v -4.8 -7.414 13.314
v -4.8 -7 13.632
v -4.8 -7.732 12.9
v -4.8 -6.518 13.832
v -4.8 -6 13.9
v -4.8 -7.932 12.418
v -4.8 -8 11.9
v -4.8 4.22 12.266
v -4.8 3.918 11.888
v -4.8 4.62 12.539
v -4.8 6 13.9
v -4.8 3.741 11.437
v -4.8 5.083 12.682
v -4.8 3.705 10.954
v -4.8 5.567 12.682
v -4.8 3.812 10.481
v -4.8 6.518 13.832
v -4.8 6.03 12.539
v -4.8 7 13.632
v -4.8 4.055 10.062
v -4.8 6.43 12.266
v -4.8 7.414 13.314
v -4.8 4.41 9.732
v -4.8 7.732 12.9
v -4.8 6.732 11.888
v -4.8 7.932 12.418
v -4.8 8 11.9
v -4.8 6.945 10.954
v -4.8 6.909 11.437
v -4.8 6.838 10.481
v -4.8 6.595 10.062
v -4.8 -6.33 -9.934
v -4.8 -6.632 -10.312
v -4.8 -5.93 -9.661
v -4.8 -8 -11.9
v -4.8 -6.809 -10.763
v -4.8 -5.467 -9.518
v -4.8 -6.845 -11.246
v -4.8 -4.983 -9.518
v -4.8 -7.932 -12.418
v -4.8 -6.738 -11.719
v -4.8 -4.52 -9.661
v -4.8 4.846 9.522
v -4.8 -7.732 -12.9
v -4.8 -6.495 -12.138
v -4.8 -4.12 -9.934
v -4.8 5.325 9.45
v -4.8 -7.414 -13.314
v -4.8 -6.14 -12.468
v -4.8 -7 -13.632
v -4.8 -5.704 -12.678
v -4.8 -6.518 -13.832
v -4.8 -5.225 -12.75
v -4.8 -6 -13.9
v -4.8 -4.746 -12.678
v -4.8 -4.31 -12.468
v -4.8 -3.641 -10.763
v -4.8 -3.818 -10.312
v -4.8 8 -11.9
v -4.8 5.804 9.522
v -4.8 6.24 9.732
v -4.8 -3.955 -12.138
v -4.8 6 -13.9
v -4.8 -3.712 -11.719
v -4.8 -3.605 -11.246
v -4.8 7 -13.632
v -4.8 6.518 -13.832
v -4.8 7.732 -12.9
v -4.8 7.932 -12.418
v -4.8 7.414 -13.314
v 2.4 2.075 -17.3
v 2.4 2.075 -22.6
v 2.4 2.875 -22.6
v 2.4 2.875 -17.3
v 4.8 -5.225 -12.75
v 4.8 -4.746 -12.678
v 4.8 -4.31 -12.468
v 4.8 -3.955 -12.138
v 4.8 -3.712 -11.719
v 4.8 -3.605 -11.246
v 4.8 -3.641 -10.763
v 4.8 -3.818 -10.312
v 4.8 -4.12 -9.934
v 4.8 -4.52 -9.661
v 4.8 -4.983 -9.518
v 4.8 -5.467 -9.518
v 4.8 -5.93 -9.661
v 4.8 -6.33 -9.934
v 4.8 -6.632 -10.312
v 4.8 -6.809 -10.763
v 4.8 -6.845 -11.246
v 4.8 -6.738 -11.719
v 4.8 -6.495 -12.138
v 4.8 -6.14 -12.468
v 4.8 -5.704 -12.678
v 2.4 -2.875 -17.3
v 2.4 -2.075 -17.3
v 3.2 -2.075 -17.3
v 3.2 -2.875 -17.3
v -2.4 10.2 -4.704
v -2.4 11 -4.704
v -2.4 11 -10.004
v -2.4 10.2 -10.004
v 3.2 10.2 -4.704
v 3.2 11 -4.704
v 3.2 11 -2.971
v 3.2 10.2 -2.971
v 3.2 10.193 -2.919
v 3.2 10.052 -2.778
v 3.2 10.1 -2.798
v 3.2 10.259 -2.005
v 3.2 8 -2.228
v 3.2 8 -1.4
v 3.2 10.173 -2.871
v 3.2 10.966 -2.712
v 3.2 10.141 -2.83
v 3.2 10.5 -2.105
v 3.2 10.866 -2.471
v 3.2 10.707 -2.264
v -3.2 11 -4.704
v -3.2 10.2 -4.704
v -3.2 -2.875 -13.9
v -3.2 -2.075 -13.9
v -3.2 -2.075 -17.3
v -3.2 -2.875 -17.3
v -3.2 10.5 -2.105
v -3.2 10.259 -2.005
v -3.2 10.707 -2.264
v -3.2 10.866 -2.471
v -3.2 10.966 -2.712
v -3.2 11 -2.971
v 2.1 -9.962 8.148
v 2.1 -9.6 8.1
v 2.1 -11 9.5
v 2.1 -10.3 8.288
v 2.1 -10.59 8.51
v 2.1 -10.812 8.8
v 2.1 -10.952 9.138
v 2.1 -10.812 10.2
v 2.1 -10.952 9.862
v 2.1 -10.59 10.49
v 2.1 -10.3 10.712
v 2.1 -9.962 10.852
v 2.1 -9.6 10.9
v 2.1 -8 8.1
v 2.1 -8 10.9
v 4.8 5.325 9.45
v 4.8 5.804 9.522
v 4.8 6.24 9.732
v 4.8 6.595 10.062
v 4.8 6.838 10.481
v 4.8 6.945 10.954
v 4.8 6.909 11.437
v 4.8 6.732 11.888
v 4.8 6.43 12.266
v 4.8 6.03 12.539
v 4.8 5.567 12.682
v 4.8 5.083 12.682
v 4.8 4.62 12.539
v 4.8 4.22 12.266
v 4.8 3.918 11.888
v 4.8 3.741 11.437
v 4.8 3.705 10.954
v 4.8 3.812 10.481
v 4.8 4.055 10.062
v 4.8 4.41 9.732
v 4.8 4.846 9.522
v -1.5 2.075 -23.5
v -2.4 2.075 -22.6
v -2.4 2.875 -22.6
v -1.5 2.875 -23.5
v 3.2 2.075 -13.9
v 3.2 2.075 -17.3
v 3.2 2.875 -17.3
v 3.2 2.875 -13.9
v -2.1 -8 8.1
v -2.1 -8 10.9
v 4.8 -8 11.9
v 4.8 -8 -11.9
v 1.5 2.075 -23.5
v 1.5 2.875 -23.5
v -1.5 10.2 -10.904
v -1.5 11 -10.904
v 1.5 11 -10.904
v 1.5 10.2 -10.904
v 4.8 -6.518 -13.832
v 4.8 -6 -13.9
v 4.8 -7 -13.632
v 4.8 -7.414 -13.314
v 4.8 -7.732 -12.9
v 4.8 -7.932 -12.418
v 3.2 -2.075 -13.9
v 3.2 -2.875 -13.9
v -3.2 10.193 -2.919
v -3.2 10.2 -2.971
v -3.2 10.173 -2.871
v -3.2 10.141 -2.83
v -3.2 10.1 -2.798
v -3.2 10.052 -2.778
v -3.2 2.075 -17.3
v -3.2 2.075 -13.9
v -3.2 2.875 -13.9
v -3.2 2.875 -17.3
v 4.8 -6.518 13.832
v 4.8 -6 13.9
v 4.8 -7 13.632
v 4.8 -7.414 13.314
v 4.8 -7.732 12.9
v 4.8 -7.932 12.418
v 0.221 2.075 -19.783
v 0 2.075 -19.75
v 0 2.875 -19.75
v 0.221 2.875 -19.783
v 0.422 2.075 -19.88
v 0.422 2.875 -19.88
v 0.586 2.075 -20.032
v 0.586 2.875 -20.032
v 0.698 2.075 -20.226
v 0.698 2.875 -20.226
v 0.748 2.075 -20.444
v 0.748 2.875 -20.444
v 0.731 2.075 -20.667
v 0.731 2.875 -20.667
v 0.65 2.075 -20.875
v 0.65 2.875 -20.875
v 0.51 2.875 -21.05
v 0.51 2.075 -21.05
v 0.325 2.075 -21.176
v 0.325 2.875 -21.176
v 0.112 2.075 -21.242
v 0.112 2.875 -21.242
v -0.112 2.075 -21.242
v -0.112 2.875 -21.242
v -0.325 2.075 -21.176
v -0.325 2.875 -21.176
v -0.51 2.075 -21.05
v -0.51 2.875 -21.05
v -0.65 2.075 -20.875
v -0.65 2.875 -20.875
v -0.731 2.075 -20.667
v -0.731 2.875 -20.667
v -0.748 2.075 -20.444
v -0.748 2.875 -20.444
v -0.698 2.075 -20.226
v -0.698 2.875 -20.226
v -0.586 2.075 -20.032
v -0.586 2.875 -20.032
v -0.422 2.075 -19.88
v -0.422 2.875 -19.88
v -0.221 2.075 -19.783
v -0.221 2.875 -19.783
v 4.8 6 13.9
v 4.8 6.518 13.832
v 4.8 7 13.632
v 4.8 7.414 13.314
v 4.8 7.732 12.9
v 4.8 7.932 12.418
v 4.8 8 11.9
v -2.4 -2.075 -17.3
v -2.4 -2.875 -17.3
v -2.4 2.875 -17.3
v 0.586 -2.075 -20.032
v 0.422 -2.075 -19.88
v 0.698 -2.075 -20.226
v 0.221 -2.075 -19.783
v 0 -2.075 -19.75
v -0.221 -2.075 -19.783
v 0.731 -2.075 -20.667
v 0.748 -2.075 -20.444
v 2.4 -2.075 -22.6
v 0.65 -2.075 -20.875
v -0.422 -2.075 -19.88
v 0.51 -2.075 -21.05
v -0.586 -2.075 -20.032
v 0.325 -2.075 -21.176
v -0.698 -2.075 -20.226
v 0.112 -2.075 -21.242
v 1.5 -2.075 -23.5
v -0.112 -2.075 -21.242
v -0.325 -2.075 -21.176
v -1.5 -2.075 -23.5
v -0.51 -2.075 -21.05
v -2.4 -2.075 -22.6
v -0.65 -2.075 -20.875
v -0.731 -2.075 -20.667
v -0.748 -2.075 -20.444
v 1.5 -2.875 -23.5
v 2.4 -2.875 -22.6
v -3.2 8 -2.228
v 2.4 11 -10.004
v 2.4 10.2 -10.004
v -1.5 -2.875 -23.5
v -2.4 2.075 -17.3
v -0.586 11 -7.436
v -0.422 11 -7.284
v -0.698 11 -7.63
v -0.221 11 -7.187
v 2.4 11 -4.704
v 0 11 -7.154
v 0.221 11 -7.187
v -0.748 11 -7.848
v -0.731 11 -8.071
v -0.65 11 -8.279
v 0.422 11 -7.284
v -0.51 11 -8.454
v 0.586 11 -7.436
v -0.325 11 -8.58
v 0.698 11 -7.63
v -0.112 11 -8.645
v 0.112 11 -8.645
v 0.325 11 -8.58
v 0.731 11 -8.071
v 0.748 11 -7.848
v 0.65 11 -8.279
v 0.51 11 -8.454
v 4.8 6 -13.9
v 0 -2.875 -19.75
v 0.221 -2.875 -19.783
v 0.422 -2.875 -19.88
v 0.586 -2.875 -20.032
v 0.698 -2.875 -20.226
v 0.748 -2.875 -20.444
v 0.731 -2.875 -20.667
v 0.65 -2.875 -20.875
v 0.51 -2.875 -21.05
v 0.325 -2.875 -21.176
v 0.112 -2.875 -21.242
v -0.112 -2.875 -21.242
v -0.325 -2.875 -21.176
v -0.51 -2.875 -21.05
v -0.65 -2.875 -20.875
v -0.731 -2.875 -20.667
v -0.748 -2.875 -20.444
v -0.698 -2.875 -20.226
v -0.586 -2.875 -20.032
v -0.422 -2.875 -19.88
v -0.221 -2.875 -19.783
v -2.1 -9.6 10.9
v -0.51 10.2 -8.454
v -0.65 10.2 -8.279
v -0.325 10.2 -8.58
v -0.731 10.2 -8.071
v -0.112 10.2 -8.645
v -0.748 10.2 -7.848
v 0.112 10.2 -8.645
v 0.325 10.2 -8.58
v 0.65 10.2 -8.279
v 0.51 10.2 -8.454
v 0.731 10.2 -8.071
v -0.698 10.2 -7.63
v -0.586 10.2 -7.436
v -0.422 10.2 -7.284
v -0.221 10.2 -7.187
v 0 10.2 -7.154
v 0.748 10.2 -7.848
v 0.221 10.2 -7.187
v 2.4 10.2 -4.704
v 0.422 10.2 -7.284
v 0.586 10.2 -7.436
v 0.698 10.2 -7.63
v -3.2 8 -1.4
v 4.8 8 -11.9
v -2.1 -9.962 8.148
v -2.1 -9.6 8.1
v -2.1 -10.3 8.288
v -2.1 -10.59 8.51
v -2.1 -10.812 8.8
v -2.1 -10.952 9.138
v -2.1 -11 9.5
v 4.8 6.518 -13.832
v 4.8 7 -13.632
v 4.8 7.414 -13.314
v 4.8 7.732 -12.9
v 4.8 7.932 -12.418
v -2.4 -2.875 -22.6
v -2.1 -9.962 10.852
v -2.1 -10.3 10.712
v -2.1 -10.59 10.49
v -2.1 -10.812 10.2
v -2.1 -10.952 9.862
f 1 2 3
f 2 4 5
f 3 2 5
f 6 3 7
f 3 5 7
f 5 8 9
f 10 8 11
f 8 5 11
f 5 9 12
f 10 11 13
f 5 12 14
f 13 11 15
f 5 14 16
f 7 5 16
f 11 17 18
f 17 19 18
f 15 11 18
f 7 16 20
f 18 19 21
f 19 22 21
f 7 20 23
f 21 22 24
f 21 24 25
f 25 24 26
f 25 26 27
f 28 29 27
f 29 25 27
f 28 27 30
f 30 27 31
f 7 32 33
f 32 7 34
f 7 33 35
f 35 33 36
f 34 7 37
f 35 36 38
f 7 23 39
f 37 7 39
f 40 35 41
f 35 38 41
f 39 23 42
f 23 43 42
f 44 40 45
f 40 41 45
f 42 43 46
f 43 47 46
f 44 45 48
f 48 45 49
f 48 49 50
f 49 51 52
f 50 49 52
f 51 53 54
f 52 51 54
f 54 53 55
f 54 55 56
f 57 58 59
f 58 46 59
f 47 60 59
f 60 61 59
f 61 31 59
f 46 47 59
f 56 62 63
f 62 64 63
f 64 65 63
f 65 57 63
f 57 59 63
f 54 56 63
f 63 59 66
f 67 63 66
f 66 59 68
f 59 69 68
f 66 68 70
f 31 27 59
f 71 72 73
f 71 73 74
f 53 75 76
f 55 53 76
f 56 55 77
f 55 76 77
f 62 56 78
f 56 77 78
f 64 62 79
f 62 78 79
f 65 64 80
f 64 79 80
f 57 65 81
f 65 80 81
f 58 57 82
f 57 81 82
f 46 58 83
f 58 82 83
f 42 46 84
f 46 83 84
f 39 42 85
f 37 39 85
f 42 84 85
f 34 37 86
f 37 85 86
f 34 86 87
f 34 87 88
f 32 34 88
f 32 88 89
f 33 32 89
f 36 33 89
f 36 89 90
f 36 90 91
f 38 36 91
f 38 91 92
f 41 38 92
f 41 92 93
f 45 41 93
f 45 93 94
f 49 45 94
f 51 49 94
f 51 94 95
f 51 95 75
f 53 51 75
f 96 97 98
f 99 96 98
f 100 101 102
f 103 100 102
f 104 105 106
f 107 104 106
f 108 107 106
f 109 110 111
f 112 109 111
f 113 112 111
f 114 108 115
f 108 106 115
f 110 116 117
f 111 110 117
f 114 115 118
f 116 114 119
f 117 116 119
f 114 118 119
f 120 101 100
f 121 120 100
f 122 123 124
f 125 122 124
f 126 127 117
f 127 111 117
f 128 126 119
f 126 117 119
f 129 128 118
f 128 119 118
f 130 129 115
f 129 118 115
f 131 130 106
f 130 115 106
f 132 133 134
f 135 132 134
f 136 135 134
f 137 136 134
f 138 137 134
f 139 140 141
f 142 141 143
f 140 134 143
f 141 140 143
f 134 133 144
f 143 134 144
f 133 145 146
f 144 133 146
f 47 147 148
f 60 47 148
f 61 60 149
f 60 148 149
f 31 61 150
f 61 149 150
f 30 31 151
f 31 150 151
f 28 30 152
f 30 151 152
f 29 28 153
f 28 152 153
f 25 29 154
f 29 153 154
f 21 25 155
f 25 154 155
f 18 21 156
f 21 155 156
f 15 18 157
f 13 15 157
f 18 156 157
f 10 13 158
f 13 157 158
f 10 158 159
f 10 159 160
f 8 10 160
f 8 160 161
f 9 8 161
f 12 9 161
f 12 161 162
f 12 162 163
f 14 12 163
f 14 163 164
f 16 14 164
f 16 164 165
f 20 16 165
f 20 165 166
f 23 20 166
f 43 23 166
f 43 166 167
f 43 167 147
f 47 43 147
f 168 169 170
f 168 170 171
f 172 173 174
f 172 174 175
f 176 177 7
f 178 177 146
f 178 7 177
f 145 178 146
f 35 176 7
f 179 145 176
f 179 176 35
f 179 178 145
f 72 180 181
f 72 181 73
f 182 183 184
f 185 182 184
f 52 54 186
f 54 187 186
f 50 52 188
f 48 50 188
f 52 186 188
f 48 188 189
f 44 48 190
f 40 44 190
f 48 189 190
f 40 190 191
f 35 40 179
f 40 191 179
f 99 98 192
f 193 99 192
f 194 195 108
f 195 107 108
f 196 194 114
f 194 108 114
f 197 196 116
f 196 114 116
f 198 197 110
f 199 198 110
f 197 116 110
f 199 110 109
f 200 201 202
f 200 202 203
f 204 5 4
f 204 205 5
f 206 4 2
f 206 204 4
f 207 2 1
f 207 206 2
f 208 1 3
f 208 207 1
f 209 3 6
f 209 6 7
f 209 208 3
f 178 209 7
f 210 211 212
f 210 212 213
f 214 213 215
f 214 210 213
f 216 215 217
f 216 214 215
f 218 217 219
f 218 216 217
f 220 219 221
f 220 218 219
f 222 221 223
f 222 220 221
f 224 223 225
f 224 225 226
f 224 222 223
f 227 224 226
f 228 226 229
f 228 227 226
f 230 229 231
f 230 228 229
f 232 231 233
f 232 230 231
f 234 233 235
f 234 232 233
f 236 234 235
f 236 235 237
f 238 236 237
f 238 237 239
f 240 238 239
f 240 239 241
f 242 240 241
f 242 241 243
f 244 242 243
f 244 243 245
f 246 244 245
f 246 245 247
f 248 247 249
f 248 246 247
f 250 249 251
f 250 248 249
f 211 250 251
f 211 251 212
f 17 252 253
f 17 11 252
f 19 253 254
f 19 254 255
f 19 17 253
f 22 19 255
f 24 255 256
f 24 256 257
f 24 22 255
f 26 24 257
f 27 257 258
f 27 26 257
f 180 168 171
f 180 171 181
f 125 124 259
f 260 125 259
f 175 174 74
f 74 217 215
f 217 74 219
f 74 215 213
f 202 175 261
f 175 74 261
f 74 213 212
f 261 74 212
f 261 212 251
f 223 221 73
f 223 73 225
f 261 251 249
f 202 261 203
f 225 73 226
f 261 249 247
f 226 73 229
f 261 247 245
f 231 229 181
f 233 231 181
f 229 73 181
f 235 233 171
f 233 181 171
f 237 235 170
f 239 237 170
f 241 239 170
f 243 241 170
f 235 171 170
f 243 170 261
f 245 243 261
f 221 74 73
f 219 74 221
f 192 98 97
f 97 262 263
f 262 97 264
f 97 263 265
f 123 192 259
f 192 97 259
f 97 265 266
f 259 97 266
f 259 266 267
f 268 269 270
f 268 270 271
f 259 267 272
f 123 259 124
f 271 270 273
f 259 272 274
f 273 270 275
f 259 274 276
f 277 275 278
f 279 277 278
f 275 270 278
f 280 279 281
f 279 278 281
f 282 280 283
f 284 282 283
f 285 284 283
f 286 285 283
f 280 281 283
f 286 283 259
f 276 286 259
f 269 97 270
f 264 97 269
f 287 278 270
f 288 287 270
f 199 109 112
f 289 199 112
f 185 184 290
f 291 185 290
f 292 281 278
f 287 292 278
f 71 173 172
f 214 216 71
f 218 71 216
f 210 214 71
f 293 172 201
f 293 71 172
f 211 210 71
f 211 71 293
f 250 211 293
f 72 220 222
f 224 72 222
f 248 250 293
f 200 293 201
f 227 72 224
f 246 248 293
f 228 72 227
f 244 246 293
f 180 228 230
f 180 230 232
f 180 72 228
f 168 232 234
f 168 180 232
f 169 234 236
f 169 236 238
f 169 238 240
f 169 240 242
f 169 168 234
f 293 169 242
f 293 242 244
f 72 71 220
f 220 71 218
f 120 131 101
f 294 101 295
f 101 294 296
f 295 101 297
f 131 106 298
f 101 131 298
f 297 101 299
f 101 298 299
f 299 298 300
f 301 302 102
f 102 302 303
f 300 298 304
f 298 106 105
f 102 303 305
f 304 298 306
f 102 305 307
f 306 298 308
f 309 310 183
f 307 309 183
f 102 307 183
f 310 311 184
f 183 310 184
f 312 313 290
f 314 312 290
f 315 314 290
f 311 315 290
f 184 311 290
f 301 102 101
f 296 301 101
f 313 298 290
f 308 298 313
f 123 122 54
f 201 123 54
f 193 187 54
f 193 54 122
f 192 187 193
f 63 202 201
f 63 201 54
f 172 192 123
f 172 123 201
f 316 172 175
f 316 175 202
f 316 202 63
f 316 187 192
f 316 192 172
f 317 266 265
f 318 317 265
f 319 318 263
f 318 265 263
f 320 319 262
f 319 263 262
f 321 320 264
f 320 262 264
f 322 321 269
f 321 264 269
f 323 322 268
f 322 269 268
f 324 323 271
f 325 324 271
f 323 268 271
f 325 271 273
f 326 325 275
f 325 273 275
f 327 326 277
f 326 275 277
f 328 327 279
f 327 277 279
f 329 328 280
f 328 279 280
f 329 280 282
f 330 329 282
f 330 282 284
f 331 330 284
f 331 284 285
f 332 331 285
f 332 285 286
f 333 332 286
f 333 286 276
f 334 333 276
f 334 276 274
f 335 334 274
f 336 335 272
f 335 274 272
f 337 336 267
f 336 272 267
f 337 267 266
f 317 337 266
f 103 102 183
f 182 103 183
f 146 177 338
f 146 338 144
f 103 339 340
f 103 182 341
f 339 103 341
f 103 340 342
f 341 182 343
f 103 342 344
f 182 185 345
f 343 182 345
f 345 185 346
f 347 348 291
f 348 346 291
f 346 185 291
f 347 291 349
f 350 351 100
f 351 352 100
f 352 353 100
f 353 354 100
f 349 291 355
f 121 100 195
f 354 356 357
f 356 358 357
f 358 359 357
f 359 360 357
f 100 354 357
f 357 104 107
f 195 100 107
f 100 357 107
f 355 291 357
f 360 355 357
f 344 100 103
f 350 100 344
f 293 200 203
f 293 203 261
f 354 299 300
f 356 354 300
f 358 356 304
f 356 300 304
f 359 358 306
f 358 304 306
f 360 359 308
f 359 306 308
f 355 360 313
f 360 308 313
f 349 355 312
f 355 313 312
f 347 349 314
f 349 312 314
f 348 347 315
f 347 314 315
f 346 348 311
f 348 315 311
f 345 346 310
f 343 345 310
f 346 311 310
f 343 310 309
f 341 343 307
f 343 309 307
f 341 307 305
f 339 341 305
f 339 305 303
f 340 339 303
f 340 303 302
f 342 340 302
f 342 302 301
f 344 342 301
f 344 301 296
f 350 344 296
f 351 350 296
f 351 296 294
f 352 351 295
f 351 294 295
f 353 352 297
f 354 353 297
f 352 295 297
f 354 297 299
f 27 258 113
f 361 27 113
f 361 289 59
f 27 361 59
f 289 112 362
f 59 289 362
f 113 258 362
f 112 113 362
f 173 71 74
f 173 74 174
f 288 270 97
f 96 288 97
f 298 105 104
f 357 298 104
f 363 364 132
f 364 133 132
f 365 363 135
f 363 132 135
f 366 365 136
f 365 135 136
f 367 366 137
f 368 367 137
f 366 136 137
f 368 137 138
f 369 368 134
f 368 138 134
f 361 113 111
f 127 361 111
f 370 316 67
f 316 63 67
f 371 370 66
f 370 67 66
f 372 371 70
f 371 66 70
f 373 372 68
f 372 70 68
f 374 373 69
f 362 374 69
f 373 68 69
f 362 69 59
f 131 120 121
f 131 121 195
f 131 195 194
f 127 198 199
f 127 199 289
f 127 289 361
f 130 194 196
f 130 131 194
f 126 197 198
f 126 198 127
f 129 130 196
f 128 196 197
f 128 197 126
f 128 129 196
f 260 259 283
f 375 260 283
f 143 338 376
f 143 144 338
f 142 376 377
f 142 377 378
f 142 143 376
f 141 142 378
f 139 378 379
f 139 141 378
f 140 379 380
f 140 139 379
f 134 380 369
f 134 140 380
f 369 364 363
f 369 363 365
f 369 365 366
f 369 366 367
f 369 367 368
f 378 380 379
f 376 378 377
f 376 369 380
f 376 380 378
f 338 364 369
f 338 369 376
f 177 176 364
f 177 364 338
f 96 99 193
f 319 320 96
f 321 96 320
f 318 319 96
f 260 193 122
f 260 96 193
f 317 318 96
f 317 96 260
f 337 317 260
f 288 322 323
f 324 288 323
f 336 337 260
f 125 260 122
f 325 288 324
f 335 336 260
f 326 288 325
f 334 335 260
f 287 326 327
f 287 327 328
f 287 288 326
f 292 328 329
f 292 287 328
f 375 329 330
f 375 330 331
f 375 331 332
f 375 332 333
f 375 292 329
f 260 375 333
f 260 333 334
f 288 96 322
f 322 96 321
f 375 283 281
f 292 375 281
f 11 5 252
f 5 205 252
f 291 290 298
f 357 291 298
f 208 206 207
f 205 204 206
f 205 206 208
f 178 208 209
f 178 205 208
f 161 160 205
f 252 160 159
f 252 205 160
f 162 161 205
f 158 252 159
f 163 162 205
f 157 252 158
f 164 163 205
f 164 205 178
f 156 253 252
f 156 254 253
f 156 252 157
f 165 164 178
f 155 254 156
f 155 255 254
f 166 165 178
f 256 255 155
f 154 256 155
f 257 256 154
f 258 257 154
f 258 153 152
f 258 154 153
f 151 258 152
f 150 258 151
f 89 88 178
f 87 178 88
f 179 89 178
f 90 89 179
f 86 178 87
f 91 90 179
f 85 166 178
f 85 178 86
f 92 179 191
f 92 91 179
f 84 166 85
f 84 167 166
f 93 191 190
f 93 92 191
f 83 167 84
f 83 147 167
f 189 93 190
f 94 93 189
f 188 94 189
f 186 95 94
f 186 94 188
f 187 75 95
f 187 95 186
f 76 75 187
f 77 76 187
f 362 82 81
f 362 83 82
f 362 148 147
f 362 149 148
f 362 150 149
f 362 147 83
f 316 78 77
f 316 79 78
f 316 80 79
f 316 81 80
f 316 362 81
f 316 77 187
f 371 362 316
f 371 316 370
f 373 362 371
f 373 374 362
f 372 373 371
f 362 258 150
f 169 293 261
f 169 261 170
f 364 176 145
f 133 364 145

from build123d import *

# Parameters (mm, degrees)
CROQUIS1_W              = 27.8
CROQUIS1_H              = 16
SALIENTE_EXTRUIR1_DEPTH = 4.8
REDONDEO1_R             = 2
SALIENTE_EXTRUIR2_START = 2.075
CROQUIS2_R              = 0.75
SALIENTE_EXTRUIR2_DEPTH = 0.8
SALIENTE_EXTRUIR3_DEPTH = 3.2
CROQUIS4_R              = 0.75
SALIENTE_EXTRUIR4_DEPTH = 0.8
CROQUIS5_R              = 1.625
CORTAR_EXTRUIR1_DEPTH   = 28.66604417
CROQUIS6_W              = 4.2
CROQUIS6_H              = 2.8
SALIENTE_EXTRUIR5_DEPTH = 3
REDONDEO2_R             = 1.4


with BuildPart() as part:
    # Croquis1 → Saliente-Extruir1 (new, symmetric)
    with BuildSketch(Plane(origin=(0, 0, 0), x_dir=(0, 0, -1), z_dir=(1, 0, 0))):
        Rectangle(CROQUIS1_W, CROQUIS1_H)
    extrude(amount=SALIENTE_EXTRUIR1_DEPTH, both=True)

    # Redondeo1
    redondeo1_edges = [part.edges().sort_by_distance(p)[0] for p in [
        (0, -8, -13.9),
        (0, -8, 13.9),
        (0, 8, 13.9),
        (0, 8, -13.9),
    ]]
    fillet(redondeo1_edges, radius=REDONDEO1_R)

    # Croquis2 → Saliente-Extruir2 (add)
    with BuildSketch(Plane(origin=(0, 0, 0), x_dir=(1, 0, 0), z_dir=(0, 1, 0)).offset(SALIENTE_EXTRUIR2_START)):
        Polygon((3.2, 13.9), (-3.2, 13.9), (-3.2, 17.3), (-2.4, 17.3), (-2.4, 22.6), (-1.5, 23.5), (1.5, 23.5), (2.4, 22.6), (2.4, 17.3), (3.2, 17.3), align=None)
        with Locations(Location((0, 20.5, 0), (0, 0, 270))):
            Circle(CROQUIS2_R, mode=Mode.SUBTRACT)
    saliente_extruir2 = extrude(amount=SALIENTE_EXTRUIR2_DEPTH)

    # Simetría1: Saliente-Extruir2 across plane
    add(saliente_extruir2.mirror(Plane.ZX))

    # Croquis3 → Saliente-Extruir3 (add, symmetric)
    with BuildSketch(Plane(origin=(0, 0, 0), x_dir=(0, 0, -1), z_dir=(1, 0, 0))):
        with BuildLine():
            Line((1.4, 8), (2.005248739, 10.258819045))
            ThreePointArc((2.005248739, 10.258819045), (2.362413136, 10.79335334), (2.971174565, 11))
            Line((2.971174565, 11), (4.703847577, 11))
            Line((4.703847577, 11), (4.703847577, 10.2))
            Line((4.703847577, 10.2), (2.971174565, 10.2))
            ThreePointArc((2.971174565, 10.2), (2.849422279, 10.158670668), (2.7779894, 10.051763809))
            Line((2.7779894, 10.051763809), (2.228220944, 8))
            Line((2.228220944, 8), (1.4, 8))
        make_face()
    extrude(amount=SALIENTE_EXTRUIR3_DEPTH, both=True)

    # Croquis4 → Saliente-Extruir4 (add)
    with BuildSketch(Plane(origin=(0, 11, 0), x_dir=(1, 0, 0), z_dir=(0, 1, 0))):
        Polygon((-2.4, 4.703847577), (-2.4, 10.003847577), (-1.5, 10.903847577), (1.5, 10.903847577), (2.4, 10.003847577), (2.4, 4.703847577), align=None)
        with Locations(Location((0, 7.903847577, 0), (0, 0, 270))):
            Circle(CROQUIS4_R, mode=Mode.SUBTRACT)
    extrude(amount=-SALIENTE_EXTRUIR4_DEPTH)

    # Croquis5 → Cortar-Extruir1 (cut, through all)
    with BuildSketch(Plane(origin=(4.8, 0, 0), x_dir=(0, 0, -1), z_dir=(1, 0, 0))):
        with Locations((-11.075, 5.325)):
            Circle(CROQUIS5_R)
        with Locations((11.125, -5.225)):
            Circle(CROQUIS5_R)
    extrude(amount=-CORTAR_EXTRUIR1_DEPTH, mode=Mode.SUBTRACT)

    # Croquis6 → Saliente-Extruir5 (add)
    with BuildSketch(Plane.XZ.offset(8)):
        with Locations((0, 9.5)):
            Rectangle(CROQUIS6_W, CROQUIS6_H)
    extrude(amount=SALIENTE_EXTRUIR5_DEPTH)

    # Redondeo2
    redondeo2_edges = [part.edges().sort_by_distance(p)[0] for p in [
        (0, -11, 8.1),
        (0, -11, 10.9),
    ]]
    fillet(redondeo2_edges, radius=REDONDEO2_R - 0.0001)  # a hair under: the kernel refuses the full size


solid = part.part
